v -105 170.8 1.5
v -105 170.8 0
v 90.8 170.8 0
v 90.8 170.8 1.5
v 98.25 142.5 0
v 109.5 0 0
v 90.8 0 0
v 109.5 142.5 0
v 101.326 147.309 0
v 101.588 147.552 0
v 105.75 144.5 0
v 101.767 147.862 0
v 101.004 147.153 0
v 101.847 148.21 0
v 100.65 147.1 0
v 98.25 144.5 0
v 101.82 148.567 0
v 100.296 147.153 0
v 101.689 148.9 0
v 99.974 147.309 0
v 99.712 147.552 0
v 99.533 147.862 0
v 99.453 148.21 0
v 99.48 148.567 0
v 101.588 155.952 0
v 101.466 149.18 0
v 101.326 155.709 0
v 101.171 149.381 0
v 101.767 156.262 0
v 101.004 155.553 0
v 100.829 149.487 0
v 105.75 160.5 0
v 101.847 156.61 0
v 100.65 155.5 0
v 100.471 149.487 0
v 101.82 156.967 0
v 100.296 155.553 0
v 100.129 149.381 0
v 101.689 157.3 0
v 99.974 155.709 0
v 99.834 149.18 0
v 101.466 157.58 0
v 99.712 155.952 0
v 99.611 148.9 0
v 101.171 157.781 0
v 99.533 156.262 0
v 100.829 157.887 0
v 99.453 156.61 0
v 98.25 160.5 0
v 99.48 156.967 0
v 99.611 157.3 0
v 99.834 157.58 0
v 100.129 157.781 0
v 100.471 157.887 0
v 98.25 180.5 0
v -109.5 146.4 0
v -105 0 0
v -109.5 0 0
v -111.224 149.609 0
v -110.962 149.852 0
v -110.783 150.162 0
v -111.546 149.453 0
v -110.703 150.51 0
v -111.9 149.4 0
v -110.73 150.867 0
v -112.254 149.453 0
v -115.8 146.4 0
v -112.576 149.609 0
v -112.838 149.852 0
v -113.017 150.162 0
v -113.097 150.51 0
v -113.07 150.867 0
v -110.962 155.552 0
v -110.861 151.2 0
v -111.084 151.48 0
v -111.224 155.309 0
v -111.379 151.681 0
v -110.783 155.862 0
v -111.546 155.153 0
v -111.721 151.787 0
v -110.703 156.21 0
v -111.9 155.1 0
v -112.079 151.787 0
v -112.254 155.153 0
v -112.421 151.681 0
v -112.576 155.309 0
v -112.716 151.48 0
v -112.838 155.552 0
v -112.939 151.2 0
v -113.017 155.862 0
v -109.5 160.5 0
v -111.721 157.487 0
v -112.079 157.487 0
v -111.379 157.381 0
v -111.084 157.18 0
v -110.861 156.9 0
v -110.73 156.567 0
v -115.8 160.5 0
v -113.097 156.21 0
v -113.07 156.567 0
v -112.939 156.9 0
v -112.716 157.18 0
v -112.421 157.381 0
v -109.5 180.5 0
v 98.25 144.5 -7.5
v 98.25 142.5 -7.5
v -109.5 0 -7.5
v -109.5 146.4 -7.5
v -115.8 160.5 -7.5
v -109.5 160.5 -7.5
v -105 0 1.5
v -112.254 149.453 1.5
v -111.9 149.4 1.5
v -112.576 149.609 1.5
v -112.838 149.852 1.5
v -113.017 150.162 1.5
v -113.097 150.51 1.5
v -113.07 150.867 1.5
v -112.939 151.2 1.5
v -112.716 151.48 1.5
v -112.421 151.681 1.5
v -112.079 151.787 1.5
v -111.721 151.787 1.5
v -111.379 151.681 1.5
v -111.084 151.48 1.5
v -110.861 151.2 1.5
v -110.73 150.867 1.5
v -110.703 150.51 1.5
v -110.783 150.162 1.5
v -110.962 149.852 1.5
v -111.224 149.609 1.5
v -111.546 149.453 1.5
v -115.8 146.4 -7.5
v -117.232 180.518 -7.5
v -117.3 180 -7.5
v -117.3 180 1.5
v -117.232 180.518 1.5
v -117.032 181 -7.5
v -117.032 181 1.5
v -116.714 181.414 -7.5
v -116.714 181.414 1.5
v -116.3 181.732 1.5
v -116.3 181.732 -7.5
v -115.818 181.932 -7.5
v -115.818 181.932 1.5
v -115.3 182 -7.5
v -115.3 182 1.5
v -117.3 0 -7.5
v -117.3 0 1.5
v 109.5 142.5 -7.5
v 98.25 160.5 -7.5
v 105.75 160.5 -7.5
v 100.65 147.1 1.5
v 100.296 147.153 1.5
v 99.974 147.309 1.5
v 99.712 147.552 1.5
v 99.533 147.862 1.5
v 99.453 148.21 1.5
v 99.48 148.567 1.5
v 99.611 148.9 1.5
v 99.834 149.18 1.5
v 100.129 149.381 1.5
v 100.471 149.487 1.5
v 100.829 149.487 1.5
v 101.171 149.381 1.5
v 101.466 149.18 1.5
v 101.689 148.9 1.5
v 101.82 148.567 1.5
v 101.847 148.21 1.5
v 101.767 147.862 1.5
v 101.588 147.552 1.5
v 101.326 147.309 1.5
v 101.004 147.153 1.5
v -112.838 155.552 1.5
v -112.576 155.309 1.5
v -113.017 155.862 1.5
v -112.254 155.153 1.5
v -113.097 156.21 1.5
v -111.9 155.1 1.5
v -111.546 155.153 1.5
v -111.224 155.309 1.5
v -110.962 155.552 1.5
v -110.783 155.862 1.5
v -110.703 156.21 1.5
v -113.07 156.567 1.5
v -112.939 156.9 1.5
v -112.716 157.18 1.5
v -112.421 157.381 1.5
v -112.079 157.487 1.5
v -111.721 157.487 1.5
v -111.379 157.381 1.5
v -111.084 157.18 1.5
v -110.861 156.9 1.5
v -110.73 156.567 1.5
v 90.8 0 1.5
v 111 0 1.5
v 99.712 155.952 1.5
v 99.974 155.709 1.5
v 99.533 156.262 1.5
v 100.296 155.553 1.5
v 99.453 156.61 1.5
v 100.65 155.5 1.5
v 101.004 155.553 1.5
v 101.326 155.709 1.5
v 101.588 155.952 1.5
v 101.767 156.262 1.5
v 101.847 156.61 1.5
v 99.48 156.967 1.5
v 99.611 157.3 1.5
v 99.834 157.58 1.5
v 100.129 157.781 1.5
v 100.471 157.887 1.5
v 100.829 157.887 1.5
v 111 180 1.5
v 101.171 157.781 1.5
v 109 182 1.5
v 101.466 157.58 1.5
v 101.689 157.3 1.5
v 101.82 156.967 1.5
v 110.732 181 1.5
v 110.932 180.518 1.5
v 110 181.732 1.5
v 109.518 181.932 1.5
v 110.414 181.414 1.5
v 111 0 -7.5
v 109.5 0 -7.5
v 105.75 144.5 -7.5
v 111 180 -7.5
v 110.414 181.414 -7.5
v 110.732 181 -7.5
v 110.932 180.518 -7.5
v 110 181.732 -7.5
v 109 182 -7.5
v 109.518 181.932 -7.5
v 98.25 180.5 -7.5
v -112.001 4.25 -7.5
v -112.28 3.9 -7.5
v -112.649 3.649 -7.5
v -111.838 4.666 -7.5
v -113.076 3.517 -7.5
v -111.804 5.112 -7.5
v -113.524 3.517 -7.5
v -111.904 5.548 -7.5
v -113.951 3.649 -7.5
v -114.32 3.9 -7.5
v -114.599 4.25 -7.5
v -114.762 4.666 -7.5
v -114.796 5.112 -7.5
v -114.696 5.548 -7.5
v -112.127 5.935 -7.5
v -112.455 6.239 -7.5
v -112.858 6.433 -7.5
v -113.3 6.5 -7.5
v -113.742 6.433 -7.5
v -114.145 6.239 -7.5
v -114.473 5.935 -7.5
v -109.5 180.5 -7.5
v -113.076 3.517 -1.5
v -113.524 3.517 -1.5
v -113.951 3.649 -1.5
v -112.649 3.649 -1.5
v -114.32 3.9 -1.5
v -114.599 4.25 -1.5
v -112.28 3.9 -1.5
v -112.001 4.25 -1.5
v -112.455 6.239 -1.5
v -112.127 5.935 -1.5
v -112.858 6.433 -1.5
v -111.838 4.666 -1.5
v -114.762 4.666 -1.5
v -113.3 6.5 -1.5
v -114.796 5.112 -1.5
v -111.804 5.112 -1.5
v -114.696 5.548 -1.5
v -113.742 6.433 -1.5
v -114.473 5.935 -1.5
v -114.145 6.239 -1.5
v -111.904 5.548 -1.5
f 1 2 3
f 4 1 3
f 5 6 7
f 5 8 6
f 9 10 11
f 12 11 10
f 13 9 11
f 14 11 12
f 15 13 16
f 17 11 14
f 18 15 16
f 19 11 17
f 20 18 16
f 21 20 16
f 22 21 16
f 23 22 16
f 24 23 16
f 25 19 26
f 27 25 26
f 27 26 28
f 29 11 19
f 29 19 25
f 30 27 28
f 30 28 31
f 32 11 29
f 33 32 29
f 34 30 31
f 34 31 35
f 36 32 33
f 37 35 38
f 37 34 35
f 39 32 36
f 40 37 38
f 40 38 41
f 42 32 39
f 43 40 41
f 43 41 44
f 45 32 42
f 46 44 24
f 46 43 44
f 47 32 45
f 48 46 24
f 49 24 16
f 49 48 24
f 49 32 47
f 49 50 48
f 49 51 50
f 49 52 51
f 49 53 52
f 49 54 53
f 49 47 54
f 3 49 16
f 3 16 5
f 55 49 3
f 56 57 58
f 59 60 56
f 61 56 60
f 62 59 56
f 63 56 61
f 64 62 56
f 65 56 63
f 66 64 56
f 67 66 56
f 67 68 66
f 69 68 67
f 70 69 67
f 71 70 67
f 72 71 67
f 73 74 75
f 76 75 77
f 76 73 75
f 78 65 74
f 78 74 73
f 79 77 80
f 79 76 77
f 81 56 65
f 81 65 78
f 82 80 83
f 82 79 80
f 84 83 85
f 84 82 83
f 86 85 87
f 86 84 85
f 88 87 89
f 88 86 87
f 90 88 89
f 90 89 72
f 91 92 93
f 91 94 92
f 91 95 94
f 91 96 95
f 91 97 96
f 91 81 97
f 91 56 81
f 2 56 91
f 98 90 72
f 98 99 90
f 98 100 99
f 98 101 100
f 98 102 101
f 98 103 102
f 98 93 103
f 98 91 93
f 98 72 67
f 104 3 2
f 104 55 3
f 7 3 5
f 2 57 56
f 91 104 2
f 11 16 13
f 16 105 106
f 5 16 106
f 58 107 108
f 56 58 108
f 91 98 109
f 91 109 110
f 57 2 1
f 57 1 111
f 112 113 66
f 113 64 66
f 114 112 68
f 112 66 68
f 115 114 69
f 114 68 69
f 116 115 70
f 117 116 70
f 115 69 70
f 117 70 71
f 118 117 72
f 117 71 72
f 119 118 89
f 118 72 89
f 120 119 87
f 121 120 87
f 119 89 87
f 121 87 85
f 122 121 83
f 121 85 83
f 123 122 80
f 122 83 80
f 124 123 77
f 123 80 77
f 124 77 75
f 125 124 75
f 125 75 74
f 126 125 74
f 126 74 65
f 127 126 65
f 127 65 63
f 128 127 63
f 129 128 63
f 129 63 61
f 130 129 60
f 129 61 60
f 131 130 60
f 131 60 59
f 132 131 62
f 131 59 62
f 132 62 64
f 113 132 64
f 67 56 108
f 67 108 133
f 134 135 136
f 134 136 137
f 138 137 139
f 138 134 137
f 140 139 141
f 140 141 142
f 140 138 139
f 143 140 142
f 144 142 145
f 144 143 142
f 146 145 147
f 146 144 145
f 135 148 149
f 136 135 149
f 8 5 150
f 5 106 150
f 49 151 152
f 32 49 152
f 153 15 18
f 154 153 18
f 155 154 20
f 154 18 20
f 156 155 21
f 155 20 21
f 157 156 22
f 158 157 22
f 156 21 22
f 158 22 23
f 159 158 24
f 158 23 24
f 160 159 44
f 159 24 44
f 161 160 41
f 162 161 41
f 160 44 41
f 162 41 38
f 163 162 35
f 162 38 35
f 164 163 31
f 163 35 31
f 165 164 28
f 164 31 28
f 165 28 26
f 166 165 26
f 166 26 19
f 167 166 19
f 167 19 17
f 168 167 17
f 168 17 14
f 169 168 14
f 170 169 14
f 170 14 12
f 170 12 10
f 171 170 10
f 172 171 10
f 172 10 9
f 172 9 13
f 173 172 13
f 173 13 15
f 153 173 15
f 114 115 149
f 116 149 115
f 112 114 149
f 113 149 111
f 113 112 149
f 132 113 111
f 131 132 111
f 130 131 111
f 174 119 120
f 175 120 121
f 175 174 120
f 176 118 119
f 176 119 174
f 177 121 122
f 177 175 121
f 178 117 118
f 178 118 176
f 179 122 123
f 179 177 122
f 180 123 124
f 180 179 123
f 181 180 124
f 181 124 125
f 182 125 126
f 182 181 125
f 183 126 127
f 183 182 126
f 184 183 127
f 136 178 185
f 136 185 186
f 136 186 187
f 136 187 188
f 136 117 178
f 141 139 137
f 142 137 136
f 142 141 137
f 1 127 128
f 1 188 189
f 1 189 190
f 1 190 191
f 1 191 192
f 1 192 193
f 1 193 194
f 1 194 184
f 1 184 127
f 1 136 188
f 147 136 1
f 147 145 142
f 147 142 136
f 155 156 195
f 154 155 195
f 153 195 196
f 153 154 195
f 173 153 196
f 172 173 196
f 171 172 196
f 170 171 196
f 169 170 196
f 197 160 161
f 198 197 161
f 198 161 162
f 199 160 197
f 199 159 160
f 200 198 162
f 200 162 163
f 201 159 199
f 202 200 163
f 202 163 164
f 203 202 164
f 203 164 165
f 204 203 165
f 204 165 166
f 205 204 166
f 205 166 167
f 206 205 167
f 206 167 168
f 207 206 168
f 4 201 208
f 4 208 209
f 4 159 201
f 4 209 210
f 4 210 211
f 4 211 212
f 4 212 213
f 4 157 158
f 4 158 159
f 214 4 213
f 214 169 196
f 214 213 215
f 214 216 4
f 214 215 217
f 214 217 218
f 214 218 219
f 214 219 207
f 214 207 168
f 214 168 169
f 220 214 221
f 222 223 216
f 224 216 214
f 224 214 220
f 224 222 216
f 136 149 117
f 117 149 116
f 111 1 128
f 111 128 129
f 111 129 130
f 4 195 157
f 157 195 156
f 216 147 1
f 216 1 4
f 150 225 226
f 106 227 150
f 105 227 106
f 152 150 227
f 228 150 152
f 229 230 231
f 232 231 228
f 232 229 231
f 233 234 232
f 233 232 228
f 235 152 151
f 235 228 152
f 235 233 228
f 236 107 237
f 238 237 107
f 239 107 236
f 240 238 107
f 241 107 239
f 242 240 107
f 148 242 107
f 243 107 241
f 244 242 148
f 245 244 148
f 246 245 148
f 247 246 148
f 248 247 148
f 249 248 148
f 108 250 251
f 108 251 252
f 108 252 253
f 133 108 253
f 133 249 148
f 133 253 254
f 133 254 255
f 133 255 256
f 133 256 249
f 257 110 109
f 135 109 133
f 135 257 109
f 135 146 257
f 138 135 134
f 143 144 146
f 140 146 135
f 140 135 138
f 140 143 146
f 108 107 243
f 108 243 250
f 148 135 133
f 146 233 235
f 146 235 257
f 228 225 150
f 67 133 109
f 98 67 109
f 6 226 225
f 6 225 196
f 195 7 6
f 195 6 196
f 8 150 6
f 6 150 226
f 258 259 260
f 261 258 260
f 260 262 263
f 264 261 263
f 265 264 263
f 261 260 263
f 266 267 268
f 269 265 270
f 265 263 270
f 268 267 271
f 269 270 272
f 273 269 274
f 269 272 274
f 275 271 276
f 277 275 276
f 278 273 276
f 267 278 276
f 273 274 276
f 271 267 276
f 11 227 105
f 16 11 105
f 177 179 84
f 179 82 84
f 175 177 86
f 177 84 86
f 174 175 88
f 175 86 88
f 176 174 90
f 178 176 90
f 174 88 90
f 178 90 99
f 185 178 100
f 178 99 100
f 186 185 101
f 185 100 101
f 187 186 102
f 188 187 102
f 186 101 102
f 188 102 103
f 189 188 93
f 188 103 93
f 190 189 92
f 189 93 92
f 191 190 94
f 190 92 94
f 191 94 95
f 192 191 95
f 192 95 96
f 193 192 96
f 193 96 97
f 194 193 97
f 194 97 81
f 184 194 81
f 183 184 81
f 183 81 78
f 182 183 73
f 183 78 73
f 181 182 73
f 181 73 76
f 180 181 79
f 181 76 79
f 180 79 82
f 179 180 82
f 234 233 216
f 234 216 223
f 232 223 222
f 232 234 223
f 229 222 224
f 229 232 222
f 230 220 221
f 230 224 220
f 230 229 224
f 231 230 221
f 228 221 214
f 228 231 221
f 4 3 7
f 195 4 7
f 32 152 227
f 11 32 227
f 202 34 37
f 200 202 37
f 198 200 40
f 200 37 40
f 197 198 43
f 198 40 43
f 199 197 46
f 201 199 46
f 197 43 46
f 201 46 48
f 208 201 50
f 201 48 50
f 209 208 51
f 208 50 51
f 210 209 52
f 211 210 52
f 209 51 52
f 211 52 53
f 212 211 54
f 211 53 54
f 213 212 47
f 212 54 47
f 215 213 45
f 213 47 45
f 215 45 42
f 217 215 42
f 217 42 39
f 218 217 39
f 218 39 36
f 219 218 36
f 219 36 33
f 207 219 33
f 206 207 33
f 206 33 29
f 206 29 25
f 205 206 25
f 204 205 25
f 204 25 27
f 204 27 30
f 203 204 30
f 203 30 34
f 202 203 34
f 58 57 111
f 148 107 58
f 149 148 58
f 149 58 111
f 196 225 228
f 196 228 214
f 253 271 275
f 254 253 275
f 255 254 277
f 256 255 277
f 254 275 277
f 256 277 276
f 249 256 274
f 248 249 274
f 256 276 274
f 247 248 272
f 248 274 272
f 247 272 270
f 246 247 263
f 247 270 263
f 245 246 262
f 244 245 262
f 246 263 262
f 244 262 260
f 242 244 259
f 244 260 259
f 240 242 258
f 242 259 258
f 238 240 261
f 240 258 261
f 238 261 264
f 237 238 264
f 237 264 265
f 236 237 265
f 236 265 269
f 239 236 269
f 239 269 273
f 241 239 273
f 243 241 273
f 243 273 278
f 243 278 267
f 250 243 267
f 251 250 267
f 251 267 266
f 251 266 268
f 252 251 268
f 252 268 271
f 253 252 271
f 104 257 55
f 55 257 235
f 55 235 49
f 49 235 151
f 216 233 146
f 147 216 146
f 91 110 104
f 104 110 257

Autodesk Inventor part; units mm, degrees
ref_plane "YZ Plane" through (0, 0, 0) normal (1, 0, 0) x (0, 1, 0)
ref_plane "XZ Plane" through (0, 0, 0) normal (0, 1, 0) x (-1, 0, 0)
ref_plane "XY Plane" through (0, 0, 0) normal (0, 0, 1) x (1, 0, 0)
sketch "Boceto1" plane through (0, 0, 0) normal (0, 0, 1) x (1, 0, 0)
  circle A0 centre (100.65, -156.7) radius 1.65 projected
  circle A1 centre (100.65, -148.3) radius 1.65 projected
  circle A2 centre (100.65, 156.7) radius 1.65 projected
  circle A3 centre (100.65, 148.3) radius 1.65 projected
  line L0 (97.75, 145) -> (105.25, 145) projected
  line L1 (105.25, 145) -> (105.25, 160) projected
  line L2 (105.25, 160) -> (97.75, 160) projected
  line L3 (97.75, 160) -> (97.75, 180) projected
  line L4 (97.75, 180) -> (-109, 180) projected
  line L5 (-109, 160) -> (-115.3, 160) projected
  line L6 (-109, -160) -> (-109, -180) projected
  line L7 (-115.3, 146.9) -> (-109, 146.9) projected
  line L8 (-109, -146.9) -> (-115.3, -146.9) projected
  line L9 (-109, 180) -> (-109, 160) projected
  line L10 (-115.3, -160) -> (-109, -160) projected
  line L11 (-109, -180) -> (97.75, -180) projected
  line L12 (97.75, -180) -> (97.75, -160) projected
  line L13 (97.75, -160) -> (105.25, -160) projected
  line L14 (105.25, -160) -> (105.25, -145) projected
  line L15 (105.25, -145) -> (97.75, -145) projected
  line L16 (97.75, -145) -> (97.75, -142) projected
  line L17 (97.75, -142) -> (109, -142) projected
  line L18 (109, -142) -> (109, 142) projected
  line L19 (109, 142) -> (97.75, 142) projected
  line L20 (97.75, 142) -> (97.75, 145) projected
  line L21 (109, 180) -> (97.75, 180)
  line L22 (-109, -160) -> (-109, -180)
  line L23 (-109, -180) -> (-102.7, -180)
  line L24 (-109, -180) -> (109, -180)
  line L25 (109, -180) -> (109, 180)
  line L26 (109, 180) -> (-109, 180)
  line L27 (111, 142) -> (111, 180)
  line L28 (109, 182) -> (97.75, 182)
  line L29 (-109, -182) -> (-102.7, -182)
  line L30 (-111, -182) -> (111, -182)
  line L31 (111, -182) -> (111, 182)
  line L32 (111, 182) -> (-111, 182)
  circle A4 centre (-111.9, -156.3) radius 1.2 projected
  circle A5 centre (-111.9, -150.6) radius 1.2 projected
  circle A6 centre (-111.9, 156.3) radius 1.2 projected
  circle A7 centre (-111.9, 150.6) radius 1.2 projected
  line L33 (-115.3, 160) -> (-115.3, 146.9) projected
  line L34 (-109, 146.9) -> (-109, -146.9) projected
  line L35 (-115.3, -146.9) -> (-115.3, -160) projected
  line L36 (-109, 180) -> (-115.3, 180)
  line L37 (-109, -180) -> (-115.3, -180)
  line L38 (-115.3, 180) -> (109, 180)
  line L39 (109, 180) -> (109, -180)
  line L40 (109, -180) -> (-115.3, -180)
  line L41 (-115.3, -180) -> (-115.3, 180)
  line L42 (-117.3, 180) -> (-117.3, -182)
  line L43 (-117.3, -182) -> (109, -182)
  line L44 (-115.3, 182) -> (111, 182)
  line L45 (111, 182) -> (111, -180)
  line L46 (-117.3, 180) -> (-117.3, 182)
  line L47 (-117.3, 182) -> (-115.3, 182)
  point P0 (0, 0)
  dimension "d1" = 2
  dimension "d3" = 2
  dimension "d20" = 2
  dimension "d21" = 2
extrude "Extrusión1" add sketch "Boceto1" against normal blind 7.5 contours L0 L1 L2 L3 L21 L25 L19 L20 | L25 L24 L12 L13 L14 L15 L16 L17 | L9 L5 L41 L36 | L37 L41 L10 L6 | L7 L34 L8 L41 | L31 L30 L29 L43 L42 L46 L47 L44 L32 L28 L27
sketch "Boceto2" plane through (0, 0, 0) normal (0, 0, 1) x (1, 0, 0)
  line L0 (-117.3, -182) -> (111, -182) projected
  line L1 (111, -182) -> (111, 182) projected
  line L2 (111, 182) -> (-117.3, 182) projected
  line L3 (90.8, 170.8) -> (90.8, -176) projected
  line L4 (90.8, 170.8) -> (90.8, -176) projected
  line L5 (-19.4789, -176) -> (90.8, -176) projected
  line L6 (90.8, -176) -> (-99.7, -176) projected
  line L7 (-99.7, -176) -> (-99.7, 170.8) projected
  line L8 (-99.7, 170.8) -> (90.8, 170.8) projected
  line L9 (-117.3, 182) -> (-117.3, -182) projected
  line L10 (-105.5008, -176) -> (-99.7, -176)
  line L11 (-99.7, 170.8) -> (-105.5008, 170.8)
  line L12 (-109, 160) -> (-109, 180) projected
  line L13 (-109, 170.8) -> (-105, 170.8)
  line L14 (-105, 170.8) -> (-105, -176)
  point P0 (0, 0)
  dimension "d33" = 4
extrude "Extrusión2" add sketch "Boceto2" along normal blind 1.5
sketch "Boceto3" plane through (-111, -182, -7.5) normal (0, -1, 0) x (1, 0, 0)
  line L0 (222, 0) -> (-6.3, 0) projected
  line L1 (222, 0) -> (222, 9) projected
  line L2 (-6.3, 9) -> (222, 9) projected
  line L3 (-6.3, 0) -> (-6.3, 9) projected
  point P0 (111, 7.5)
extrude "Extrusión3" add sketch "Boceto3" along normal blind 5.2
sketch "Boceto5" plane through (0, 0, 1.5) normal (0, 0, 1) x (1, 0, 0)
  circle A0 centre (100.65, -156.7) radius 1.65 projected
  circle A1 centre (100.65, -148.3) radius 1.65 projected
  circle A2 centre (100.65, 156.7) radius 1.65 projected
  circle A3 centre (100.65, 148.3) radius 1.65 projected
  line L0 (97.75, 145) -> (105.25, 145) projected
  line L1 (105.25, 145) -> (105.25, 160) projected
  line L2 (105.25, 160) -> (97.75, 160) projected
  line L3 (97.75, 160) -> (97.75, 180) projected
  line L4 (97.75, 180) -> (-109, 180) projected
  line L5 (-109, 160) -> (-115.3, 160) projected
  line L6 (-109, -160) -> (-109, -180) projected
  line L7 (-115.3, 146.9) -> (-109, 146.9) projected
  line L8 (-109, -146.9) -> (-115.3, -146.9) projected
  line L9 (-109, 180) -> (-109, 160) projected
  line L10 (-115.3, -160) -> (-109, -160) projected
  line L11 (-109, -180) -> (97.75, -180) projected
  line L12 (97.75, -180) -> (97.75, -160) projected
  line L13 (97.75, -160) -> (105.25, -160) projected
  line L14 (105.25, -160) -> (105.25, -145) projected
  line L15 (105.25, -145) -> (97.75, -145) projected
  line L16 (97.75, -145) -> (97.75, -142) projected
  line L17 (97.75, -142) -> (109, -142) projected
  line L18 (109, -142) -> (109, 142) projected
  line L19 (109, 142) -> (97.75, 142) projected
  line L20 (97.75, 142) -> (97.75, 145) projected
  circle A4 centre (-111.9, -156.3) radius 1.2 projected
  circle A5 centre (-111.9, -150.6) radius 1.2 projected
  circle A6 centre (-111.9, 156.3) radius 1.2 projected
  circle A7 centre (-111.9, 150.6) radius 1.2 projected
  line L21 (-115.3, 160) -> (-115.3, 146.9) projected
  line L22 (-109, 146.9) -> (-109, -146.9) projected
  line L23 (-115.3, -146.9) -> (-115.3, -160) projected
  point P0 (0, 0)
hole "Agujero1" at (100.65, 148.3, 1.5) at (100.65, 156.7, 1.5) at (100.65, -156.7, 1.5) at (100.65, -148.3, 1.5) at (-111.9, -156.3, 1.5) at (-111.9, -150.6, 1.5) at (-111.9, 150.6, 1.5) at (-111.9, 156.3, 1.5) direction (0, 0, -1) diameter 2.4 end through all
sketch "Boceto6" plane through (0, 0, -7.5) normal (0, 0, -1) x (-1, 0, 0)
  line L0 (117.3, 182) -> (-111, 182) projected
  line L1 (-111, 182) -> (-111, -187.2) projected
  line L2 (117.3, -187.2) -> (-111, -187.2) projected
  line L3 (117.3, 182) -> (117.3, -187.2) projected
  line L4 (-97.75, 160) -> (-97.75, 180) projected
  line L5 (-97.75, 180) -> (109, 180) projected
  line L6 (109, 180) -> (109, 160) projected
  line L7 (109, 160) -> (115.3, 160) projected
  line L8 (115.3, 160) -> (115.3, 146.9) projected
  line L9 (115.3, 146.9) -> (109, 146.9) projected
  line L10 (109, 146.9) -> (109, -146.9) projected
  line L11 (109, -146.9) -> (115.3, -146.9) projected
  line L12 (115.3, -146.9) -> (115.3, -160) projected
  line L13 (115.3, -160) -> (109, -160) projected
  line L14 (109, -160) -> (109, -180) projected
  line L15 (109, -180) -> (-97.75, -180) projected
  line L16 (-97.75, -180) -> (-97.75, -160) projected
  line L17 (-97.75, -160) -> (-105.25, -160) projected
  line L18 (-105.25, -160) -> (-105.25, -145) projected
  line L19 (-105.25, -145) -> (-97.75, -145) projected
  line L20 (-97.75, -145) -> (-97.75, -142) projected
  line L21 (-97.75, -142) -> (-109, -142) projected
  line L22 (-109, -142) -> (-109, 142) projected
  line L23 (-109, 142) -> (-97.75, 142) projected
  line L24 (-97.75, 142) -> (-97.75, 145) projected
  line L25 (-97.75, 145) -> (-105.25, 145) projected
  line L26 (-105.25, 145) -> (-105.25, 160) projected
  line L27 (-105.25, 160) -> (-97.75, 160) projected
  line L28 (117.3, 182) -> (117.3, -187.2) projected
  line L29 (117.3, 182) -> (-111, 182) projected
  line L30 (-111, 182) -> (-111, -187.2) projected
  line L31 (117.3, -187.2) -> (-111, -187.2) projected
  line L32 (109.5, 160.5) -> (109.5, 180.5)
  line L33 (109.5, 180.5) -> (-98.25, 180.5)
  line L34 (-98.25, 180.5) -> (-98.25, 160.5)
  line L35 (-98.25, 160.5) -> (-105.75, 160.5)
  line L36 (-105.75, 160.5) -> (-105.75, 144.5)
  line L37 (-105.75, 144.5) -> (-98.25, 144.5)
  line L38 (-98.25, 144.5) -> (-98.25, 142.5)
  line L39 (-98.25, 142.5) -> (-109.5, 142.5)
  line L40 (-109.5, 142.5) -> (-109.5, -142.5)
  line L41 (-109.5, -142.5) -> (-98.25, -142.5)
  line L42 (-98.25, -142.5) -> (-98.25, -144.5)
  line L43 (-98.25, -144.5) -> (-105.75, -144.5)
  line L44 (-105.75, -144.5) -> (-105.75, -160.5)
  line L45 (-105.75, -160.5) -> (-98.25, -160.5)
  line L46 (-98.25, -160.5) -> (-98.25, -180.5)
  line L47 (-98.25, -180.5) -> (109.5, -180.5)
  line L48 (109.5, -180.5) -> (109.5, -160.5)
  line L49 (109.5, -160.5) -> (115.8, -160.5)
  line L50 (115.8, -160.5) -> (115.8, -146.4)
  line L51 (115.8, -146.4) -> (109.5, -146.4)
  line L52 (109.5, -146.4) -> (109.5, 146.4)
  line L53 (109.5, 146.4) -> (115.8, 146.4)
  line L54 (115.8, 146.4) -> (115.8, 160.5)
  line L55 (115.8, 160.5) -> (109.5, 160.5)
  dimension "d22" = 0.5
extrude "Extrusión4" cut sketch "Boceto6" against normal blind 7.5 contours L55 L54 L53 L52 L51 L50 L49 L48 L47 L46 L45 L44 L43 L42 L41 L40 L39 L38 L37 L36 L35 L34 L33 L32
fillet "Empalme1" radius 2 5 edges at (-117.3, 182, 0.75) (-117.3, 182, -3.75) (111, 182, -3) (111, -187.2, -3) (-117.3, -187.2, -3)
sketch "Boceto7" plane through (0, 0, -7.5) normal (0, 0, -1) x (-1, 0, 0)
  arc A0 (117.3, 7) -> (114.3, 10) centre (114.3, 7) ccw projected
  line L0 (114.3, 10) -> (100.3, 10) projected
  arc A1 (100.3, 10) -> (97.3, 7) centre (100.3, 7) ccw projected
  line L1 (97.3, 7) -> (97.3, -7) projected
  arc A2 (97.3, -7) -> (100.3, -10) centre (100.3, -7) ccw projected
  line L2 (100.3, -10) -> (114.3, -10) projected
  arc A3 (114.3, -10) -> (117.3, -7) centre (114.3, -7) ccw projected
  line L3 (117.3, -7) -> (117.3, 7) projected
  circle A4 centre (103.3, -5) radius 1 projected
  circle A5 centre (113.3, 5) radius 1 projected
  circle A6 centre (103.3, 5) radius 1 projected
  circle A7 centre (113.3, -5) radius 1 projected
  circle A8 centre (113.3, 5) radius 1 projected
  point P0 (0, 0)
hole "Agujero2" at (-113.3, 5, -7.5) at (-113.3, -5, -7.5) direction (0, 0, 1) diameter 3 depth 6
split "Dividir4" plane through (0, 0, 0) removes the side toward (0, -1, 0)
